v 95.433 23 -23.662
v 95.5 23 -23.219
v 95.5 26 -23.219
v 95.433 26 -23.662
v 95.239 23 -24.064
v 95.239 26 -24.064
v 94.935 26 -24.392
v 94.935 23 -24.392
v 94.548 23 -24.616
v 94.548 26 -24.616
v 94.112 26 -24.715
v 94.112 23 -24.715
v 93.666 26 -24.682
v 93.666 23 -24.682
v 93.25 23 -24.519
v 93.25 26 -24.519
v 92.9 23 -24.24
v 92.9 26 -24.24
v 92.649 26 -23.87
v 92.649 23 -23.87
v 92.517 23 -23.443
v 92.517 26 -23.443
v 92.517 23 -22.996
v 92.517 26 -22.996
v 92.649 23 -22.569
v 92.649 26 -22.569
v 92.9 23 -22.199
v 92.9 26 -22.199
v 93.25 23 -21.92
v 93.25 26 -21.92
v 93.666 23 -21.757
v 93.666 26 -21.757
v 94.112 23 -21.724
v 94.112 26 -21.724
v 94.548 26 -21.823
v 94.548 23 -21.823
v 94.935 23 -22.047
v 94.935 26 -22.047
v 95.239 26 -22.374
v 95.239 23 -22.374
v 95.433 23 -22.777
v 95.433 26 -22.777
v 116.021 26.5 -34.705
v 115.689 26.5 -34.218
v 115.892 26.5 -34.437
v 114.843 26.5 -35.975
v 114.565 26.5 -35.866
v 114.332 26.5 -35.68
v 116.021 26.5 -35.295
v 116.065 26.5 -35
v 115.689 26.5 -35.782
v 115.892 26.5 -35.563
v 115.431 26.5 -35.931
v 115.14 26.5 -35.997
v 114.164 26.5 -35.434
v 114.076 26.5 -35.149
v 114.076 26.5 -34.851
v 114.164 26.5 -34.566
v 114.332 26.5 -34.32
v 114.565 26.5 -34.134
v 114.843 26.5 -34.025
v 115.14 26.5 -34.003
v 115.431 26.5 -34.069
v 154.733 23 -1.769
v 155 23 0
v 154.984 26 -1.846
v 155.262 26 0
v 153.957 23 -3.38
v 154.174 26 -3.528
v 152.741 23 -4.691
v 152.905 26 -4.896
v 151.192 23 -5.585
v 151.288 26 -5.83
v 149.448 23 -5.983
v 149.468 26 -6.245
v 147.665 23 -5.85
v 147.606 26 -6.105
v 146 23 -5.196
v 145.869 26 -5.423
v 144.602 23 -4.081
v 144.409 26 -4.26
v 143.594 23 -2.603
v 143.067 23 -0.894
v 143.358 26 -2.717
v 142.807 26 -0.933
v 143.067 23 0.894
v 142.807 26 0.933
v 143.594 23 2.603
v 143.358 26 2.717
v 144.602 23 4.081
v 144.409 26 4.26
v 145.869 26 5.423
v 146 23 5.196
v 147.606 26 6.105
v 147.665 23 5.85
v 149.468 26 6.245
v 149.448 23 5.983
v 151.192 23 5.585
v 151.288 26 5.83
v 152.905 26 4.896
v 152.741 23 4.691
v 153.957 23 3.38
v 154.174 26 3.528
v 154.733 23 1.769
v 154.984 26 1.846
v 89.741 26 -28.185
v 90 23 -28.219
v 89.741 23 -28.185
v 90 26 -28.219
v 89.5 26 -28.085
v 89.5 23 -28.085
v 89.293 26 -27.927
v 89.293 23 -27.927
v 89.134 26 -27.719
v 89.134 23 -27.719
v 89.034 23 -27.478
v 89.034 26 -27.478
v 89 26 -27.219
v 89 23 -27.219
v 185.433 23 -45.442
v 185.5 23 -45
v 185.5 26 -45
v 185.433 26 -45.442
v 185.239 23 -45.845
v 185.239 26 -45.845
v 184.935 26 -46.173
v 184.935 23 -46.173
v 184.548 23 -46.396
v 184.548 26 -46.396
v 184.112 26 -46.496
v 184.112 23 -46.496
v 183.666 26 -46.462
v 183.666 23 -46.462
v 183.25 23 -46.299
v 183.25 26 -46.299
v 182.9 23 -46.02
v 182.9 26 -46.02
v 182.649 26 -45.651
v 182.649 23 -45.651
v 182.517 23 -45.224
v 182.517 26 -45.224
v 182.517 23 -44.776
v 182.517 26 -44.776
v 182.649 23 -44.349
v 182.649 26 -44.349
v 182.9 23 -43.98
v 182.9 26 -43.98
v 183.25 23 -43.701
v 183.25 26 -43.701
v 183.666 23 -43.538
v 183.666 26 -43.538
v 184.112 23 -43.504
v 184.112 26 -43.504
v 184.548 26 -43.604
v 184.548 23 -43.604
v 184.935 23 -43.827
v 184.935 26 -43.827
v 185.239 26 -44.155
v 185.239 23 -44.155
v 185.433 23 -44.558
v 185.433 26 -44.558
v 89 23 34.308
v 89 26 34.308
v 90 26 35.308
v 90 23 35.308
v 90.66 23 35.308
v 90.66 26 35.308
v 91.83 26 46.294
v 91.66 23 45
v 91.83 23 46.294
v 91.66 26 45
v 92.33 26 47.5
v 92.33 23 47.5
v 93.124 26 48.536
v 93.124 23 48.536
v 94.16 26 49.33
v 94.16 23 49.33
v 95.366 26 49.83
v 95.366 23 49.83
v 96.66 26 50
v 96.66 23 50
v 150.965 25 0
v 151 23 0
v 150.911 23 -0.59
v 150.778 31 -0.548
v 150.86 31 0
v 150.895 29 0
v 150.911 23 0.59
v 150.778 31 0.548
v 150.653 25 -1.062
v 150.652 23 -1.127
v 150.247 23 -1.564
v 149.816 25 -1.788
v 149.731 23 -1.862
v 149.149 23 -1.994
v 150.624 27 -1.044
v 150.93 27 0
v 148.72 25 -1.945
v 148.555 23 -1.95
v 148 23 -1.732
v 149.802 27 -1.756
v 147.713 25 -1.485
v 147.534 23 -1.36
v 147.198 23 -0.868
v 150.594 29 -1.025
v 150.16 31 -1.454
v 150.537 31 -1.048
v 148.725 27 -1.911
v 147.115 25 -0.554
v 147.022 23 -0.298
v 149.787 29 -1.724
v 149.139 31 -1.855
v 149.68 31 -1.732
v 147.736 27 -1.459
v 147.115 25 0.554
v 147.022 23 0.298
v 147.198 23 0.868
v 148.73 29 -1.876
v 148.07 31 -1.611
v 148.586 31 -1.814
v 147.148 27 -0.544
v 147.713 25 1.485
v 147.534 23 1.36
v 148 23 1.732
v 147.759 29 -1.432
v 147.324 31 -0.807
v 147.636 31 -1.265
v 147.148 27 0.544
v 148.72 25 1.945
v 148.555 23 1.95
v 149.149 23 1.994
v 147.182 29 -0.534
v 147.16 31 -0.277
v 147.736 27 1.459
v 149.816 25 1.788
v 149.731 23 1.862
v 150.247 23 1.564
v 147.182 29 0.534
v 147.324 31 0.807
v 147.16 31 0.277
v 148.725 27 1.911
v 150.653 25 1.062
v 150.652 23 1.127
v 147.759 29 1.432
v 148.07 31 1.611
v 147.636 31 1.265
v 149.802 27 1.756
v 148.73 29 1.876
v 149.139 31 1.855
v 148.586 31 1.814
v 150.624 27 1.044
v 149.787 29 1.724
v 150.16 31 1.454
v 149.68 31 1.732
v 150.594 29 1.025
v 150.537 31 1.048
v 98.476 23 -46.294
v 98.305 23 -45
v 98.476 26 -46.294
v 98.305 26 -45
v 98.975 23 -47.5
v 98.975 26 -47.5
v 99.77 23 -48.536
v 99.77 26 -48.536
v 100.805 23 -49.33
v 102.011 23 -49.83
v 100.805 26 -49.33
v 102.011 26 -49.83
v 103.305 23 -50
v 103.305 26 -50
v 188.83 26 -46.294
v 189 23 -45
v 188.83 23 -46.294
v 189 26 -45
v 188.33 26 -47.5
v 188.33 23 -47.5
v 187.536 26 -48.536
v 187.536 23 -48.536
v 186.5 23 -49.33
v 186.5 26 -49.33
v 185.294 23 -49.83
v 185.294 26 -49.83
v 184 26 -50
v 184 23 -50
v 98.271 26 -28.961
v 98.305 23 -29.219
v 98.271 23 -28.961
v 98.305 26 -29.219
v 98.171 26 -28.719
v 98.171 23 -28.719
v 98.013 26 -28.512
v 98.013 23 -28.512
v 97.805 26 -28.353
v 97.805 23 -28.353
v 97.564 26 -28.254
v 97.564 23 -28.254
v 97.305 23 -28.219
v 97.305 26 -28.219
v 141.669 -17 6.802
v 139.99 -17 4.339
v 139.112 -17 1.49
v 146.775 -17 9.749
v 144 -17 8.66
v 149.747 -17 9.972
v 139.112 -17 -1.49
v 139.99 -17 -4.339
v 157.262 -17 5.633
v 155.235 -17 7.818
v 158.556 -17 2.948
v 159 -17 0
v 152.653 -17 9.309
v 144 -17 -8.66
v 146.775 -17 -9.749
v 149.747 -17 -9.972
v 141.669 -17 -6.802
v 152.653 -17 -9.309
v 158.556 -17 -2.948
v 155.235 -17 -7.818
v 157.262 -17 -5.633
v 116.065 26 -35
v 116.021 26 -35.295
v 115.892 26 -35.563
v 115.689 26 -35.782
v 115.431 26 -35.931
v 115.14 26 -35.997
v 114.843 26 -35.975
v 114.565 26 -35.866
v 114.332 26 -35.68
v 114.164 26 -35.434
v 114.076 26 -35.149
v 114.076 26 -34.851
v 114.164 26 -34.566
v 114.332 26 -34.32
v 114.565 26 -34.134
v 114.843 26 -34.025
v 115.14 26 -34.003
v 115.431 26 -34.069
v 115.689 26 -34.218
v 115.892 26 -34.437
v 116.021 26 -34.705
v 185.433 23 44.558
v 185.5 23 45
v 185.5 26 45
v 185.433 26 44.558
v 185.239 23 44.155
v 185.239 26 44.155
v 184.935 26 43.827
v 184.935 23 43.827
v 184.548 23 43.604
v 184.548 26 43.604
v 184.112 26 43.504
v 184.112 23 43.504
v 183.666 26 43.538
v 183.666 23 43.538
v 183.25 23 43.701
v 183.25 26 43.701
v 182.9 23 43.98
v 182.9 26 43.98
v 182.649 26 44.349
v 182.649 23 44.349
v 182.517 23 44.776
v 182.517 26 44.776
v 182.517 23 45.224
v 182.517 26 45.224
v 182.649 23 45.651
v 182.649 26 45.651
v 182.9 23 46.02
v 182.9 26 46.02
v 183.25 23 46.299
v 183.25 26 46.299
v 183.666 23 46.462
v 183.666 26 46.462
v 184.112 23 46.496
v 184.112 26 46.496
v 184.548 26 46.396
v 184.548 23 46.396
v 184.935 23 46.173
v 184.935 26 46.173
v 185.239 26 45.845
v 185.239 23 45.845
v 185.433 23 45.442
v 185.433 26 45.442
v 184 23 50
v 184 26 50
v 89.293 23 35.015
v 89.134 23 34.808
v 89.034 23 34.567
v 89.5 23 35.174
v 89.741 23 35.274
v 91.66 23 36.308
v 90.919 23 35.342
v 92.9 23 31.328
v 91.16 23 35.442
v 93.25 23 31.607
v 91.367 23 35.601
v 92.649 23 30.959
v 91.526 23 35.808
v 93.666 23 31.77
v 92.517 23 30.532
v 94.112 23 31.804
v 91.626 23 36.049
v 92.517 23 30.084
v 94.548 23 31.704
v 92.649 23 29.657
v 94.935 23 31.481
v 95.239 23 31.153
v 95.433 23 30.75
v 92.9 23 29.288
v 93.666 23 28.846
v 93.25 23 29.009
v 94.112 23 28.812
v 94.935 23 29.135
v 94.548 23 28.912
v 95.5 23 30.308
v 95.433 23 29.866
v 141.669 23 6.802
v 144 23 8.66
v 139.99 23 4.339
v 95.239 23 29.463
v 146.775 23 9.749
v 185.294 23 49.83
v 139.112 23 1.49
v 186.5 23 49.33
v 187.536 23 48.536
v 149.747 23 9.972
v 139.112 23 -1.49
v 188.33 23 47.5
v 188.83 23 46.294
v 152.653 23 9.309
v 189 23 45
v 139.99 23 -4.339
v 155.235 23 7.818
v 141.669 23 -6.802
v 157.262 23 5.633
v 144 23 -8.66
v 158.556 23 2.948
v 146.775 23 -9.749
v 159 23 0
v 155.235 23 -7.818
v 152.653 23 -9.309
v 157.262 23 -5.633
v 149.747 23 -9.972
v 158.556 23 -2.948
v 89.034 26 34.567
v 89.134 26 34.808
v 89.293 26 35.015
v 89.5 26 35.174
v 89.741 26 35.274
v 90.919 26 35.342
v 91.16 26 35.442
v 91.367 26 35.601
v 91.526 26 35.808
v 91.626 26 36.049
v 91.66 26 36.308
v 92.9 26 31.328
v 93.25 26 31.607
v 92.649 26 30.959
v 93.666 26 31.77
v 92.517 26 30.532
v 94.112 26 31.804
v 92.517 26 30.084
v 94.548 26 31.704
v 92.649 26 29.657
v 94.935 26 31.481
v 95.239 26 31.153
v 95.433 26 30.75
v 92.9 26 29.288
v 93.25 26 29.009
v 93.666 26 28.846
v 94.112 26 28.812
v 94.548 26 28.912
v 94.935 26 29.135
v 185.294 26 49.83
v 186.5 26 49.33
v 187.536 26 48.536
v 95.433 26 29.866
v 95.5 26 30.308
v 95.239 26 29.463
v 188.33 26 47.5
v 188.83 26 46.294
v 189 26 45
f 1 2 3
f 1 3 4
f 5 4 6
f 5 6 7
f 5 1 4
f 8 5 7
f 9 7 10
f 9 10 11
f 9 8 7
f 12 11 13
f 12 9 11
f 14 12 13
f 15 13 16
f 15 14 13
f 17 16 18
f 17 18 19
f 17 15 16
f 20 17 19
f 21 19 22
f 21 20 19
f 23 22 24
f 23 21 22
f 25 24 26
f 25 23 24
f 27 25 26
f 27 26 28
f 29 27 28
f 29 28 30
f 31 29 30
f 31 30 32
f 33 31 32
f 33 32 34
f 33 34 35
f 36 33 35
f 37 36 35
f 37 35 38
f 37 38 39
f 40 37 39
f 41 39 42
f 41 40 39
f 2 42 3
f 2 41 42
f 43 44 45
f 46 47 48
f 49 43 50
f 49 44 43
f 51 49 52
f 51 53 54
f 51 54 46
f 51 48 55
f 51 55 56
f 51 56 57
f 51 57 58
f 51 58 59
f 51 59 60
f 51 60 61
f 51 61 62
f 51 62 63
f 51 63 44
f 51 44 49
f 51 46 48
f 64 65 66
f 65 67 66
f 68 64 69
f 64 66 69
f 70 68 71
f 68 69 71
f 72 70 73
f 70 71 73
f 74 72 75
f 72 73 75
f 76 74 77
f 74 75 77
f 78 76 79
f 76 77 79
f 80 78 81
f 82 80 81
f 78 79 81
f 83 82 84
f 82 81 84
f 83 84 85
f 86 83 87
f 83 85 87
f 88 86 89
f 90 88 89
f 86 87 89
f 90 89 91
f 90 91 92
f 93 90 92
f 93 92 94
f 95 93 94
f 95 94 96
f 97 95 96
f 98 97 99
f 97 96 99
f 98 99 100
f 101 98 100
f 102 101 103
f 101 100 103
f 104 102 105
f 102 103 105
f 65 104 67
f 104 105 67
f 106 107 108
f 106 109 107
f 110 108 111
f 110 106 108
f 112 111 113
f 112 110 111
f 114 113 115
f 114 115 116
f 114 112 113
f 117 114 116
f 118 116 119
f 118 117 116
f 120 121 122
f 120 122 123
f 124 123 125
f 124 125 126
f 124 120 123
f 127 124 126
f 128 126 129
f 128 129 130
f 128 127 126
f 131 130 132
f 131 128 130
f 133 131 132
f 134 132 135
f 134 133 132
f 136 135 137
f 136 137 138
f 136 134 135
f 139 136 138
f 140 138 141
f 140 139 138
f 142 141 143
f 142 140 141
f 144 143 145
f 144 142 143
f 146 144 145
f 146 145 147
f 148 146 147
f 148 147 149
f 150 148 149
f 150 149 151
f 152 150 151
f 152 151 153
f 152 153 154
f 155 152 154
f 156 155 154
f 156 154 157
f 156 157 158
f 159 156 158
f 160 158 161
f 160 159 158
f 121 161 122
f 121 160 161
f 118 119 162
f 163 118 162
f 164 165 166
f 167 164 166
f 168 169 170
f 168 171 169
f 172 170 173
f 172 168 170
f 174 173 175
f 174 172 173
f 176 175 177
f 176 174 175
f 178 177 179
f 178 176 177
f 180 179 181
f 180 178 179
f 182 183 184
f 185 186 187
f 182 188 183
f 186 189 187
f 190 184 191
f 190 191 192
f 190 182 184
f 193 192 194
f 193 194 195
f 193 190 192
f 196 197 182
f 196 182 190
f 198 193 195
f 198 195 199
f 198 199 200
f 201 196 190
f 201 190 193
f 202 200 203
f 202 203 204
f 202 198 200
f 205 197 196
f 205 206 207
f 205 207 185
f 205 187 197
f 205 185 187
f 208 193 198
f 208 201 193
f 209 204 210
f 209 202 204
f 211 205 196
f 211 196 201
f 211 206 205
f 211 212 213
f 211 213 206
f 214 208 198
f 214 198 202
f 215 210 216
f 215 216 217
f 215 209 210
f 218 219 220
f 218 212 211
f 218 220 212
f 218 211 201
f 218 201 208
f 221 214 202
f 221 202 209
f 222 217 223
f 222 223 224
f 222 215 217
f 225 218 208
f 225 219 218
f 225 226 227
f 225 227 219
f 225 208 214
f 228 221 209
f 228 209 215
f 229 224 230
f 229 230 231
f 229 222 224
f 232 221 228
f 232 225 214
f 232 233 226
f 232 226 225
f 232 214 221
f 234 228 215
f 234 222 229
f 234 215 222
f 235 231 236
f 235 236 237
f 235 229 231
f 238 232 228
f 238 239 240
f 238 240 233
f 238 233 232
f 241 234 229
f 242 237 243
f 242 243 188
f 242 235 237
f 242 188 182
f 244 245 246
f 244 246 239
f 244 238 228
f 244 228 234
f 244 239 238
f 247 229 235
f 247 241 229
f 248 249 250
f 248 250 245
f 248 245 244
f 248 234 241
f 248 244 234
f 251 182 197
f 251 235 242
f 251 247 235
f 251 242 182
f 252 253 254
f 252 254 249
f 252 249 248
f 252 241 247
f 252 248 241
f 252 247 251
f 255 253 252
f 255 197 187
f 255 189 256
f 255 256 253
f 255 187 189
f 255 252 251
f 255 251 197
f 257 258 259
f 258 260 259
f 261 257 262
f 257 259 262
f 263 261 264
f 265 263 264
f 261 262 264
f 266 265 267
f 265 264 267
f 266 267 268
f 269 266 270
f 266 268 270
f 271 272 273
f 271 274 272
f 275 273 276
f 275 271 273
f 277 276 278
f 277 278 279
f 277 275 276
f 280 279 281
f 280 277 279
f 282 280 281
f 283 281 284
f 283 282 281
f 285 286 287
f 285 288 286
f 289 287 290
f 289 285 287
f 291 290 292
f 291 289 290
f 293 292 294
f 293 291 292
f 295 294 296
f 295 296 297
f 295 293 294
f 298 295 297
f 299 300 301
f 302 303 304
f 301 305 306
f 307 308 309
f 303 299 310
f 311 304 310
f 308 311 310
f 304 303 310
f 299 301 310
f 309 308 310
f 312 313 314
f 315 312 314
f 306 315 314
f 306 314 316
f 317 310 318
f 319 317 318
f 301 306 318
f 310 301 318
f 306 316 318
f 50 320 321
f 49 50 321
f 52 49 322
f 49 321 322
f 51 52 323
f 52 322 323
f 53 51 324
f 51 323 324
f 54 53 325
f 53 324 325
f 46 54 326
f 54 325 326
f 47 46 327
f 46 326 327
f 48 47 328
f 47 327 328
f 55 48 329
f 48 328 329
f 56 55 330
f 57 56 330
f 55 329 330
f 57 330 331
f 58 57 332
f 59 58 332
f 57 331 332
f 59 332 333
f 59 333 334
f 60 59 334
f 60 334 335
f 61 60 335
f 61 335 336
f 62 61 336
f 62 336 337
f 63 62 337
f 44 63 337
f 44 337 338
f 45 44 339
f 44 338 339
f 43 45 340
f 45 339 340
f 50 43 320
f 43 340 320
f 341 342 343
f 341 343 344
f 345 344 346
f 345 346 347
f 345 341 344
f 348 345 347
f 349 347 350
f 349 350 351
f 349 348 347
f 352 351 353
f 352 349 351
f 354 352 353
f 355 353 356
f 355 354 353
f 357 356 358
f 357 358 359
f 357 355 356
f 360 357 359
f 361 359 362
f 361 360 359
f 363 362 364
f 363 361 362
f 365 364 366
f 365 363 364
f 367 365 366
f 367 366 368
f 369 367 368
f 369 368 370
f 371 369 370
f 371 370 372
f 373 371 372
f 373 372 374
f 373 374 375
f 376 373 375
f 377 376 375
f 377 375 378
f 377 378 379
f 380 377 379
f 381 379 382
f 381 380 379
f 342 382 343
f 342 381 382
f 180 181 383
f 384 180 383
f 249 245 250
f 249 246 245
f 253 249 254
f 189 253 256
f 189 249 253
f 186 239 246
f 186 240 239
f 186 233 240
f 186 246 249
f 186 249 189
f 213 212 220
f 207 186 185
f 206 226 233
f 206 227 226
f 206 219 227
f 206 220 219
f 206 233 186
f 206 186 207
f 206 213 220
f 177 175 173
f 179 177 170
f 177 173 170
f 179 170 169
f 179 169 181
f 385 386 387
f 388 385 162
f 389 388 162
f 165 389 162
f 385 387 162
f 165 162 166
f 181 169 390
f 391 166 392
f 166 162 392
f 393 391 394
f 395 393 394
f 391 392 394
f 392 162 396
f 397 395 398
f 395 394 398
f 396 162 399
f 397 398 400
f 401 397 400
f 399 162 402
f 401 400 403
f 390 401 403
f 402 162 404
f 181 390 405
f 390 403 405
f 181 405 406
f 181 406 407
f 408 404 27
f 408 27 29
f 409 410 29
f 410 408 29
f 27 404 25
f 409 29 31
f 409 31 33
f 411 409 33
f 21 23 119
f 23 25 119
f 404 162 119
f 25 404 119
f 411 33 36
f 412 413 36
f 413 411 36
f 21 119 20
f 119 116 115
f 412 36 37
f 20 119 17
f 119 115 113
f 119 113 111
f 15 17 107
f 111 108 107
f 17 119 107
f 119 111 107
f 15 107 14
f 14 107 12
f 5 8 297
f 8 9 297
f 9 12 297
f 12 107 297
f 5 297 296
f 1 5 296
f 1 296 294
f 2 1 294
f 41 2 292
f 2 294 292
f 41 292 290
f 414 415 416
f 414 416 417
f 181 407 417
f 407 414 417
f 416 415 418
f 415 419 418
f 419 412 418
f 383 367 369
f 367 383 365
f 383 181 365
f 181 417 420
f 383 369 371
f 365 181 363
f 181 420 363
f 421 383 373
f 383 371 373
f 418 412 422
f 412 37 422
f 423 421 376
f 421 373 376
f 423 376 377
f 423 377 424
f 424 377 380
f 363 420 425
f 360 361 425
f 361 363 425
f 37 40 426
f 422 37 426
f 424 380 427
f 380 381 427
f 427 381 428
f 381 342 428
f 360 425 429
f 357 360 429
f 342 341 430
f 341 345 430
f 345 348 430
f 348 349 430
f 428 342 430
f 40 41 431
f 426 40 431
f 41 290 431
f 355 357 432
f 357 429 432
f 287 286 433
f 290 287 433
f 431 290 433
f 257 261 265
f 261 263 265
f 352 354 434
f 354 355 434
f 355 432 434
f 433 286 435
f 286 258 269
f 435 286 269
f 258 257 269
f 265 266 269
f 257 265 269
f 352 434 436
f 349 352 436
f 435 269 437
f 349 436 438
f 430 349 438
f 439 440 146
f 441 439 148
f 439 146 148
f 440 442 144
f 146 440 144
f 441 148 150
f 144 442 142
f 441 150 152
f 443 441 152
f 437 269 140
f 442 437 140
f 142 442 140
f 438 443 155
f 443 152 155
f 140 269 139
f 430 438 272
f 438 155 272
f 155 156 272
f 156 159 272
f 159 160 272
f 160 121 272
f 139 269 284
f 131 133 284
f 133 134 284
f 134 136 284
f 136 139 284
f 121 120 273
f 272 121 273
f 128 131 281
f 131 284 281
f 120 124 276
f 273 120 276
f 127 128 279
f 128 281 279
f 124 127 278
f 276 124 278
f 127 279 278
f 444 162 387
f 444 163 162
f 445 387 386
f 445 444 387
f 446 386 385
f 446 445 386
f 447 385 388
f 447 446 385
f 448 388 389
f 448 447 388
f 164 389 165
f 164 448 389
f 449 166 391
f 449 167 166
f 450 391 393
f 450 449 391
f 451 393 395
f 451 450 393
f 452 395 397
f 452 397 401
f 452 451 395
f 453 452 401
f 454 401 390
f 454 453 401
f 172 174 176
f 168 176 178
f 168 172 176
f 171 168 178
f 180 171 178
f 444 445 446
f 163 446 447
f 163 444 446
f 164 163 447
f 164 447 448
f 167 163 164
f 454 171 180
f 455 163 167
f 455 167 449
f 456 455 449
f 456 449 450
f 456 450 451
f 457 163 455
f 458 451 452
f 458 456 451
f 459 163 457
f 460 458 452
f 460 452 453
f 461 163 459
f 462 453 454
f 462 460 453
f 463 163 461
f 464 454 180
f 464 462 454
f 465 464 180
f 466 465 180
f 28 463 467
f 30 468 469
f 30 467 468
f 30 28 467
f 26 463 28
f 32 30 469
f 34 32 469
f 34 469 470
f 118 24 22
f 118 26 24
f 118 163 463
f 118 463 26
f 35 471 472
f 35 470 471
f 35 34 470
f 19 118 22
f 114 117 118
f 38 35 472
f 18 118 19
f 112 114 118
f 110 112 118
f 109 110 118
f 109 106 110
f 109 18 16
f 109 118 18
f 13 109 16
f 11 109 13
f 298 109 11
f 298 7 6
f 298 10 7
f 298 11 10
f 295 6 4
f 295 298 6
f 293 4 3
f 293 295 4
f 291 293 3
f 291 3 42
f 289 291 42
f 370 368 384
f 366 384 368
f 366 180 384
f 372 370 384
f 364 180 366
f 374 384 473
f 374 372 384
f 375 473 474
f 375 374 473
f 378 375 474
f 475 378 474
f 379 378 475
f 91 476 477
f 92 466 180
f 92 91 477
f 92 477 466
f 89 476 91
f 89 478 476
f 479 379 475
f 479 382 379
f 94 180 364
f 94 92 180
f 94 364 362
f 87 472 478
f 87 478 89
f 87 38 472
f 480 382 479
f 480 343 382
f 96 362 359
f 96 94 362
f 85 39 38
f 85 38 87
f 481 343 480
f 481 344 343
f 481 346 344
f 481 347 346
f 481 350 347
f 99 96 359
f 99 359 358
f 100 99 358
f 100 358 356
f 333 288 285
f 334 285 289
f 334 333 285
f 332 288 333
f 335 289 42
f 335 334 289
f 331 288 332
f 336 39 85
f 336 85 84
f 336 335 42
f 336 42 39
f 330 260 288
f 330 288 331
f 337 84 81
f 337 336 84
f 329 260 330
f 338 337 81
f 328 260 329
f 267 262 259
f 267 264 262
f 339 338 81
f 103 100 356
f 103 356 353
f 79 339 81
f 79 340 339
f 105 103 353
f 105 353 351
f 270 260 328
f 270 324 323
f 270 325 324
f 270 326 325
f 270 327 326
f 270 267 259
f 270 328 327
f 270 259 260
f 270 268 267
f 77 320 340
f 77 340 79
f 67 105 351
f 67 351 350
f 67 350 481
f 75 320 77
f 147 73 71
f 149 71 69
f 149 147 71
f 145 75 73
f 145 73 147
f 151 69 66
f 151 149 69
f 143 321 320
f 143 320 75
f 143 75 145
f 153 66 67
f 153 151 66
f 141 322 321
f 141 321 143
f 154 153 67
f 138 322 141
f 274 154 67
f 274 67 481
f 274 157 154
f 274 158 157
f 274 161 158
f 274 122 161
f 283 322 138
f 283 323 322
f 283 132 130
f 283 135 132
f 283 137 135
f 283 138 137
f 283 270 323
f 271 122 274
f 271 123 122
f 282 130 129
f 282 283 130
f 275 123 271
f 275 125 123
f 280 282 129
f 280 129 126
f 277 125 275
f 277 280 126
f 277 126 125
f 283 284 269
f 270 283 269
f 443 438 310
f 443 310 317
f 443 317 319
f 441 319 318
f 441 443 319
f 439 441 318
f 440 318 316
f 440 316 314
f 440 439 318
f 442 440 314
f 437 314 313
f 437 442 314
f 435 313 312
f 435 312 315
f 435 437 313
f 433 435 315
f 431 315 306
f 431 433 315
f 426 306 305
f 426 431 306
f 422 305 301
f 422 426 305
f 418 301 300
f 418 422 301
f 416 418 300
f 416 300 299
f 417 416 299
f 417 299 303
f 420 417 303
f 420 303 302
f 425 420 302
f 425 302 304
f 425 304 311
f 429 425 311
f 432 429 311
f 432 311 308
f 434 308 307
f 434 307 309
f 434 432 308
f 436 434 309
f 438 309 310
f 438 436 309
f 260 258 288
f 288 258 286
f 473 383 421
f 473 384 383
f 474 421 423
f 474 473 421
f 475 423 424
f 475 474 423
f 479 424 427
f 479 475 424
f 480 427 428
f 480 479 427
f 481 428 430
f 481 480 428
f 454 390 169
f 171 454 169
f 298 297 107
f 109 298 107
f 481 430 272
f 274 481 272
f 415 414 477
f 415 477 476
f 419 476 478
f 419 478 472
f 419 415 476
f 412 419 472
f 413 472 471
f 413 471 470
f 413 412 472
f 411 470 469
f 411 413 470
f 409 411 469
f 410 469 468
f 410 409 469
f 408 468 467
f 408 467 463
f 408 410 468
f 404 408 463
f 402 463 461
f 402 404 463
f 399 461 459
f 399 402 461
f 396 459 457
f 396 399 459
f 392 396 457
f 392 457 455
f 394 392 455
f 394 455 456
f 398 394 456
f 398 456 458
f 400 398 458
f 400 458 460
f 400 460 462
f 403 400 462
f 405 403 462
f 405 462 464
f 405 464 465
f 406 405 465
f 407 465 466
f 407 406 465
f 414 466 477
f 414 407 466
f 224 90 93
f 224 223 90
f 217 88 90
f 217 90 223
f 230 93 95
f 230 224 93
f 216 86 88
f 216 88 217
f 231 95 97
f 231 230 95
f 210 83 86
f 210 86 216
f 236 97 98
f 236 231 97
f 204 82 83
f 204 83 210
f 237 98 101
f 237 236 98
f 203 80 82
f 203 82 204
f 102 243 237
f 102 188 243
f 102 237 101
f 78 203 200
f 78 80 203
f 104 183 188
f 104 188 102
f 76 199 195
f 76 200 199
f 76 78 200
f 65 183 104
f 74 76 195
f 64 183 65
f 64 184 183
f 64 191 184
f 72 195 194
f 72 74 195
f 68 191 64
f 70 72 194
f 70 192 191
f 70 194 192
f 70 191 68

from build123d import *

# Parameters (mm, degrees)
BOSS_EXTRUDE1_DEPTH = 3
FILLET3_R           = 5
FILLET2_R           = 1
SKETCH2_R           = 1.5
CUT_EXTRUDE1_DEPTH  = 3
SKETCH5_R           = 10
BOSS_EXTRUDE2_DEPTH = 40
SKETCH3_R           = 6
CUT_EXTRUDE3_DEPTH  = 3
CUT_EXTRUDE3_TAPER  = -5
SKETCH6_R           = 2
BOSS_EXTRUDE3_DEPTH = 8
BOSS_EXTRUDE3_TAPER = 1
SKETCH7_R           = 1
BOSS_EXTRUDE4_DEPTH = 0.5


with BuildPart() as part:
    # Sketch1 → Boss-Extrude1 (new body)
    with BuildSketch(Plane(origin=(0, 23, 0), x_dir=(1, 0, 0), z_dir=(0, 1, 0))):
        Polygon((98.305417602, 50), (98.305417602, 28.219474586), (89, 28.219474586), (89, -35.308001182), (91.659783805, -35.308001182), (91.659783805, -50), (97.650210801, -50), (189, -50), (189, 50), align=None)
    extrude(amount=BOSS_EXTRUDE1_DEPTH)

    # Fillet3
    fillet3_edges = [part.edges().sort_by_distance(p)[0] for p in [
        (189, 24.5, 50),
        (91.659783805, 24.5, 50),
        (98.305417602, 24.5, -50),
        (189, 24.5, -50),
    ]]
    fillet(fillet3_edges, radius=FILLET3_R)

    # Fillet2
    fillet2_edges = [part.edges().sort_by_distance(p)[0] for p in [
        (91.659783805, 24.5, 35.308001182),
        (89, 24.5, 35.308001182),
        (89, 24.5, -28.219474586),
        (98.305417602, 24.5, -28.219474586),
    ]]
    fillet(fillet2_edges, radius=FILLET2_R)

    # Sketch2 → Cut-Extrude1 (cut)
    with BuildSketch(Plane(origin=(0, 23, 0), x_dir=(1, 0, 0), z_dir=(0, 1, 0))):
        with Locations((184, -45)):
            Circle(SKETCH2_R)
        with Locations((94, -30.308001182)):
            Circle(SKETCH2_R)
        with Locations((94, 23.219474586)):
            Circle(SKETCH2_R)
        with Locations((184, 45)):
            Circle(SKETCH2_R)
    extrude(amount=CUT_EXTRUDE1_DEPTH, mode=Mode.SUBTRACT)

    # Sketch5 → Boss-Extrude2 (add)
    with BuildSketch(Plane(origin=(0, 23, 0), x_dir=(1, 0, 0), z_dir=(0, 1, 0))):
        with Locations((149, 0)):
            Circle(SKETCH5_R)
    extrude(amount=-BOSS_EXTRUDE2_DEPTH)

    # Sketch3 → Cut-Extrude3 (cut)
    with BuildSketch(Plane(origin=(0, 23, 0), x_dir=(1, 0, 0), z_dir=(0, 1, 0))):
        with Locations((149, 0)):
            Circle(SKETCH3_R)
    extrude(amount=CUT_EXTRUDE3_DEPTH, taper=CUT_EXTRUDE3_TAPER, mode=Mode.SUBTRACT)

    # Sketch6 → Boss-Extrude3 (add)
    with BuildSketch(Plane(origin=(0, 23, 0), x_dir=(1, 0, 0), z_dir=(0, 1, 0))):
        with Locations((149, 0)):
            Circle(SKETCH6_R)
    extrude(amount=BOSS_EXTRUDE3_DEPTH, taper=BOSS_EXTRUDE3_TAPER)

    # Sketch7 → Boss-Extrude4 (add)
    with BuildSketch(Plane(origin=(0, 26, 0), x_dir=(1, 0, 0), z_dir=(0, 1, 0))):
        with Locations((115.065320099, 35)):
            Circle(SKETCH7_R)
    extrude(amount=BOSS_EXTRUDE4_DEPTH)


solid = part.part
